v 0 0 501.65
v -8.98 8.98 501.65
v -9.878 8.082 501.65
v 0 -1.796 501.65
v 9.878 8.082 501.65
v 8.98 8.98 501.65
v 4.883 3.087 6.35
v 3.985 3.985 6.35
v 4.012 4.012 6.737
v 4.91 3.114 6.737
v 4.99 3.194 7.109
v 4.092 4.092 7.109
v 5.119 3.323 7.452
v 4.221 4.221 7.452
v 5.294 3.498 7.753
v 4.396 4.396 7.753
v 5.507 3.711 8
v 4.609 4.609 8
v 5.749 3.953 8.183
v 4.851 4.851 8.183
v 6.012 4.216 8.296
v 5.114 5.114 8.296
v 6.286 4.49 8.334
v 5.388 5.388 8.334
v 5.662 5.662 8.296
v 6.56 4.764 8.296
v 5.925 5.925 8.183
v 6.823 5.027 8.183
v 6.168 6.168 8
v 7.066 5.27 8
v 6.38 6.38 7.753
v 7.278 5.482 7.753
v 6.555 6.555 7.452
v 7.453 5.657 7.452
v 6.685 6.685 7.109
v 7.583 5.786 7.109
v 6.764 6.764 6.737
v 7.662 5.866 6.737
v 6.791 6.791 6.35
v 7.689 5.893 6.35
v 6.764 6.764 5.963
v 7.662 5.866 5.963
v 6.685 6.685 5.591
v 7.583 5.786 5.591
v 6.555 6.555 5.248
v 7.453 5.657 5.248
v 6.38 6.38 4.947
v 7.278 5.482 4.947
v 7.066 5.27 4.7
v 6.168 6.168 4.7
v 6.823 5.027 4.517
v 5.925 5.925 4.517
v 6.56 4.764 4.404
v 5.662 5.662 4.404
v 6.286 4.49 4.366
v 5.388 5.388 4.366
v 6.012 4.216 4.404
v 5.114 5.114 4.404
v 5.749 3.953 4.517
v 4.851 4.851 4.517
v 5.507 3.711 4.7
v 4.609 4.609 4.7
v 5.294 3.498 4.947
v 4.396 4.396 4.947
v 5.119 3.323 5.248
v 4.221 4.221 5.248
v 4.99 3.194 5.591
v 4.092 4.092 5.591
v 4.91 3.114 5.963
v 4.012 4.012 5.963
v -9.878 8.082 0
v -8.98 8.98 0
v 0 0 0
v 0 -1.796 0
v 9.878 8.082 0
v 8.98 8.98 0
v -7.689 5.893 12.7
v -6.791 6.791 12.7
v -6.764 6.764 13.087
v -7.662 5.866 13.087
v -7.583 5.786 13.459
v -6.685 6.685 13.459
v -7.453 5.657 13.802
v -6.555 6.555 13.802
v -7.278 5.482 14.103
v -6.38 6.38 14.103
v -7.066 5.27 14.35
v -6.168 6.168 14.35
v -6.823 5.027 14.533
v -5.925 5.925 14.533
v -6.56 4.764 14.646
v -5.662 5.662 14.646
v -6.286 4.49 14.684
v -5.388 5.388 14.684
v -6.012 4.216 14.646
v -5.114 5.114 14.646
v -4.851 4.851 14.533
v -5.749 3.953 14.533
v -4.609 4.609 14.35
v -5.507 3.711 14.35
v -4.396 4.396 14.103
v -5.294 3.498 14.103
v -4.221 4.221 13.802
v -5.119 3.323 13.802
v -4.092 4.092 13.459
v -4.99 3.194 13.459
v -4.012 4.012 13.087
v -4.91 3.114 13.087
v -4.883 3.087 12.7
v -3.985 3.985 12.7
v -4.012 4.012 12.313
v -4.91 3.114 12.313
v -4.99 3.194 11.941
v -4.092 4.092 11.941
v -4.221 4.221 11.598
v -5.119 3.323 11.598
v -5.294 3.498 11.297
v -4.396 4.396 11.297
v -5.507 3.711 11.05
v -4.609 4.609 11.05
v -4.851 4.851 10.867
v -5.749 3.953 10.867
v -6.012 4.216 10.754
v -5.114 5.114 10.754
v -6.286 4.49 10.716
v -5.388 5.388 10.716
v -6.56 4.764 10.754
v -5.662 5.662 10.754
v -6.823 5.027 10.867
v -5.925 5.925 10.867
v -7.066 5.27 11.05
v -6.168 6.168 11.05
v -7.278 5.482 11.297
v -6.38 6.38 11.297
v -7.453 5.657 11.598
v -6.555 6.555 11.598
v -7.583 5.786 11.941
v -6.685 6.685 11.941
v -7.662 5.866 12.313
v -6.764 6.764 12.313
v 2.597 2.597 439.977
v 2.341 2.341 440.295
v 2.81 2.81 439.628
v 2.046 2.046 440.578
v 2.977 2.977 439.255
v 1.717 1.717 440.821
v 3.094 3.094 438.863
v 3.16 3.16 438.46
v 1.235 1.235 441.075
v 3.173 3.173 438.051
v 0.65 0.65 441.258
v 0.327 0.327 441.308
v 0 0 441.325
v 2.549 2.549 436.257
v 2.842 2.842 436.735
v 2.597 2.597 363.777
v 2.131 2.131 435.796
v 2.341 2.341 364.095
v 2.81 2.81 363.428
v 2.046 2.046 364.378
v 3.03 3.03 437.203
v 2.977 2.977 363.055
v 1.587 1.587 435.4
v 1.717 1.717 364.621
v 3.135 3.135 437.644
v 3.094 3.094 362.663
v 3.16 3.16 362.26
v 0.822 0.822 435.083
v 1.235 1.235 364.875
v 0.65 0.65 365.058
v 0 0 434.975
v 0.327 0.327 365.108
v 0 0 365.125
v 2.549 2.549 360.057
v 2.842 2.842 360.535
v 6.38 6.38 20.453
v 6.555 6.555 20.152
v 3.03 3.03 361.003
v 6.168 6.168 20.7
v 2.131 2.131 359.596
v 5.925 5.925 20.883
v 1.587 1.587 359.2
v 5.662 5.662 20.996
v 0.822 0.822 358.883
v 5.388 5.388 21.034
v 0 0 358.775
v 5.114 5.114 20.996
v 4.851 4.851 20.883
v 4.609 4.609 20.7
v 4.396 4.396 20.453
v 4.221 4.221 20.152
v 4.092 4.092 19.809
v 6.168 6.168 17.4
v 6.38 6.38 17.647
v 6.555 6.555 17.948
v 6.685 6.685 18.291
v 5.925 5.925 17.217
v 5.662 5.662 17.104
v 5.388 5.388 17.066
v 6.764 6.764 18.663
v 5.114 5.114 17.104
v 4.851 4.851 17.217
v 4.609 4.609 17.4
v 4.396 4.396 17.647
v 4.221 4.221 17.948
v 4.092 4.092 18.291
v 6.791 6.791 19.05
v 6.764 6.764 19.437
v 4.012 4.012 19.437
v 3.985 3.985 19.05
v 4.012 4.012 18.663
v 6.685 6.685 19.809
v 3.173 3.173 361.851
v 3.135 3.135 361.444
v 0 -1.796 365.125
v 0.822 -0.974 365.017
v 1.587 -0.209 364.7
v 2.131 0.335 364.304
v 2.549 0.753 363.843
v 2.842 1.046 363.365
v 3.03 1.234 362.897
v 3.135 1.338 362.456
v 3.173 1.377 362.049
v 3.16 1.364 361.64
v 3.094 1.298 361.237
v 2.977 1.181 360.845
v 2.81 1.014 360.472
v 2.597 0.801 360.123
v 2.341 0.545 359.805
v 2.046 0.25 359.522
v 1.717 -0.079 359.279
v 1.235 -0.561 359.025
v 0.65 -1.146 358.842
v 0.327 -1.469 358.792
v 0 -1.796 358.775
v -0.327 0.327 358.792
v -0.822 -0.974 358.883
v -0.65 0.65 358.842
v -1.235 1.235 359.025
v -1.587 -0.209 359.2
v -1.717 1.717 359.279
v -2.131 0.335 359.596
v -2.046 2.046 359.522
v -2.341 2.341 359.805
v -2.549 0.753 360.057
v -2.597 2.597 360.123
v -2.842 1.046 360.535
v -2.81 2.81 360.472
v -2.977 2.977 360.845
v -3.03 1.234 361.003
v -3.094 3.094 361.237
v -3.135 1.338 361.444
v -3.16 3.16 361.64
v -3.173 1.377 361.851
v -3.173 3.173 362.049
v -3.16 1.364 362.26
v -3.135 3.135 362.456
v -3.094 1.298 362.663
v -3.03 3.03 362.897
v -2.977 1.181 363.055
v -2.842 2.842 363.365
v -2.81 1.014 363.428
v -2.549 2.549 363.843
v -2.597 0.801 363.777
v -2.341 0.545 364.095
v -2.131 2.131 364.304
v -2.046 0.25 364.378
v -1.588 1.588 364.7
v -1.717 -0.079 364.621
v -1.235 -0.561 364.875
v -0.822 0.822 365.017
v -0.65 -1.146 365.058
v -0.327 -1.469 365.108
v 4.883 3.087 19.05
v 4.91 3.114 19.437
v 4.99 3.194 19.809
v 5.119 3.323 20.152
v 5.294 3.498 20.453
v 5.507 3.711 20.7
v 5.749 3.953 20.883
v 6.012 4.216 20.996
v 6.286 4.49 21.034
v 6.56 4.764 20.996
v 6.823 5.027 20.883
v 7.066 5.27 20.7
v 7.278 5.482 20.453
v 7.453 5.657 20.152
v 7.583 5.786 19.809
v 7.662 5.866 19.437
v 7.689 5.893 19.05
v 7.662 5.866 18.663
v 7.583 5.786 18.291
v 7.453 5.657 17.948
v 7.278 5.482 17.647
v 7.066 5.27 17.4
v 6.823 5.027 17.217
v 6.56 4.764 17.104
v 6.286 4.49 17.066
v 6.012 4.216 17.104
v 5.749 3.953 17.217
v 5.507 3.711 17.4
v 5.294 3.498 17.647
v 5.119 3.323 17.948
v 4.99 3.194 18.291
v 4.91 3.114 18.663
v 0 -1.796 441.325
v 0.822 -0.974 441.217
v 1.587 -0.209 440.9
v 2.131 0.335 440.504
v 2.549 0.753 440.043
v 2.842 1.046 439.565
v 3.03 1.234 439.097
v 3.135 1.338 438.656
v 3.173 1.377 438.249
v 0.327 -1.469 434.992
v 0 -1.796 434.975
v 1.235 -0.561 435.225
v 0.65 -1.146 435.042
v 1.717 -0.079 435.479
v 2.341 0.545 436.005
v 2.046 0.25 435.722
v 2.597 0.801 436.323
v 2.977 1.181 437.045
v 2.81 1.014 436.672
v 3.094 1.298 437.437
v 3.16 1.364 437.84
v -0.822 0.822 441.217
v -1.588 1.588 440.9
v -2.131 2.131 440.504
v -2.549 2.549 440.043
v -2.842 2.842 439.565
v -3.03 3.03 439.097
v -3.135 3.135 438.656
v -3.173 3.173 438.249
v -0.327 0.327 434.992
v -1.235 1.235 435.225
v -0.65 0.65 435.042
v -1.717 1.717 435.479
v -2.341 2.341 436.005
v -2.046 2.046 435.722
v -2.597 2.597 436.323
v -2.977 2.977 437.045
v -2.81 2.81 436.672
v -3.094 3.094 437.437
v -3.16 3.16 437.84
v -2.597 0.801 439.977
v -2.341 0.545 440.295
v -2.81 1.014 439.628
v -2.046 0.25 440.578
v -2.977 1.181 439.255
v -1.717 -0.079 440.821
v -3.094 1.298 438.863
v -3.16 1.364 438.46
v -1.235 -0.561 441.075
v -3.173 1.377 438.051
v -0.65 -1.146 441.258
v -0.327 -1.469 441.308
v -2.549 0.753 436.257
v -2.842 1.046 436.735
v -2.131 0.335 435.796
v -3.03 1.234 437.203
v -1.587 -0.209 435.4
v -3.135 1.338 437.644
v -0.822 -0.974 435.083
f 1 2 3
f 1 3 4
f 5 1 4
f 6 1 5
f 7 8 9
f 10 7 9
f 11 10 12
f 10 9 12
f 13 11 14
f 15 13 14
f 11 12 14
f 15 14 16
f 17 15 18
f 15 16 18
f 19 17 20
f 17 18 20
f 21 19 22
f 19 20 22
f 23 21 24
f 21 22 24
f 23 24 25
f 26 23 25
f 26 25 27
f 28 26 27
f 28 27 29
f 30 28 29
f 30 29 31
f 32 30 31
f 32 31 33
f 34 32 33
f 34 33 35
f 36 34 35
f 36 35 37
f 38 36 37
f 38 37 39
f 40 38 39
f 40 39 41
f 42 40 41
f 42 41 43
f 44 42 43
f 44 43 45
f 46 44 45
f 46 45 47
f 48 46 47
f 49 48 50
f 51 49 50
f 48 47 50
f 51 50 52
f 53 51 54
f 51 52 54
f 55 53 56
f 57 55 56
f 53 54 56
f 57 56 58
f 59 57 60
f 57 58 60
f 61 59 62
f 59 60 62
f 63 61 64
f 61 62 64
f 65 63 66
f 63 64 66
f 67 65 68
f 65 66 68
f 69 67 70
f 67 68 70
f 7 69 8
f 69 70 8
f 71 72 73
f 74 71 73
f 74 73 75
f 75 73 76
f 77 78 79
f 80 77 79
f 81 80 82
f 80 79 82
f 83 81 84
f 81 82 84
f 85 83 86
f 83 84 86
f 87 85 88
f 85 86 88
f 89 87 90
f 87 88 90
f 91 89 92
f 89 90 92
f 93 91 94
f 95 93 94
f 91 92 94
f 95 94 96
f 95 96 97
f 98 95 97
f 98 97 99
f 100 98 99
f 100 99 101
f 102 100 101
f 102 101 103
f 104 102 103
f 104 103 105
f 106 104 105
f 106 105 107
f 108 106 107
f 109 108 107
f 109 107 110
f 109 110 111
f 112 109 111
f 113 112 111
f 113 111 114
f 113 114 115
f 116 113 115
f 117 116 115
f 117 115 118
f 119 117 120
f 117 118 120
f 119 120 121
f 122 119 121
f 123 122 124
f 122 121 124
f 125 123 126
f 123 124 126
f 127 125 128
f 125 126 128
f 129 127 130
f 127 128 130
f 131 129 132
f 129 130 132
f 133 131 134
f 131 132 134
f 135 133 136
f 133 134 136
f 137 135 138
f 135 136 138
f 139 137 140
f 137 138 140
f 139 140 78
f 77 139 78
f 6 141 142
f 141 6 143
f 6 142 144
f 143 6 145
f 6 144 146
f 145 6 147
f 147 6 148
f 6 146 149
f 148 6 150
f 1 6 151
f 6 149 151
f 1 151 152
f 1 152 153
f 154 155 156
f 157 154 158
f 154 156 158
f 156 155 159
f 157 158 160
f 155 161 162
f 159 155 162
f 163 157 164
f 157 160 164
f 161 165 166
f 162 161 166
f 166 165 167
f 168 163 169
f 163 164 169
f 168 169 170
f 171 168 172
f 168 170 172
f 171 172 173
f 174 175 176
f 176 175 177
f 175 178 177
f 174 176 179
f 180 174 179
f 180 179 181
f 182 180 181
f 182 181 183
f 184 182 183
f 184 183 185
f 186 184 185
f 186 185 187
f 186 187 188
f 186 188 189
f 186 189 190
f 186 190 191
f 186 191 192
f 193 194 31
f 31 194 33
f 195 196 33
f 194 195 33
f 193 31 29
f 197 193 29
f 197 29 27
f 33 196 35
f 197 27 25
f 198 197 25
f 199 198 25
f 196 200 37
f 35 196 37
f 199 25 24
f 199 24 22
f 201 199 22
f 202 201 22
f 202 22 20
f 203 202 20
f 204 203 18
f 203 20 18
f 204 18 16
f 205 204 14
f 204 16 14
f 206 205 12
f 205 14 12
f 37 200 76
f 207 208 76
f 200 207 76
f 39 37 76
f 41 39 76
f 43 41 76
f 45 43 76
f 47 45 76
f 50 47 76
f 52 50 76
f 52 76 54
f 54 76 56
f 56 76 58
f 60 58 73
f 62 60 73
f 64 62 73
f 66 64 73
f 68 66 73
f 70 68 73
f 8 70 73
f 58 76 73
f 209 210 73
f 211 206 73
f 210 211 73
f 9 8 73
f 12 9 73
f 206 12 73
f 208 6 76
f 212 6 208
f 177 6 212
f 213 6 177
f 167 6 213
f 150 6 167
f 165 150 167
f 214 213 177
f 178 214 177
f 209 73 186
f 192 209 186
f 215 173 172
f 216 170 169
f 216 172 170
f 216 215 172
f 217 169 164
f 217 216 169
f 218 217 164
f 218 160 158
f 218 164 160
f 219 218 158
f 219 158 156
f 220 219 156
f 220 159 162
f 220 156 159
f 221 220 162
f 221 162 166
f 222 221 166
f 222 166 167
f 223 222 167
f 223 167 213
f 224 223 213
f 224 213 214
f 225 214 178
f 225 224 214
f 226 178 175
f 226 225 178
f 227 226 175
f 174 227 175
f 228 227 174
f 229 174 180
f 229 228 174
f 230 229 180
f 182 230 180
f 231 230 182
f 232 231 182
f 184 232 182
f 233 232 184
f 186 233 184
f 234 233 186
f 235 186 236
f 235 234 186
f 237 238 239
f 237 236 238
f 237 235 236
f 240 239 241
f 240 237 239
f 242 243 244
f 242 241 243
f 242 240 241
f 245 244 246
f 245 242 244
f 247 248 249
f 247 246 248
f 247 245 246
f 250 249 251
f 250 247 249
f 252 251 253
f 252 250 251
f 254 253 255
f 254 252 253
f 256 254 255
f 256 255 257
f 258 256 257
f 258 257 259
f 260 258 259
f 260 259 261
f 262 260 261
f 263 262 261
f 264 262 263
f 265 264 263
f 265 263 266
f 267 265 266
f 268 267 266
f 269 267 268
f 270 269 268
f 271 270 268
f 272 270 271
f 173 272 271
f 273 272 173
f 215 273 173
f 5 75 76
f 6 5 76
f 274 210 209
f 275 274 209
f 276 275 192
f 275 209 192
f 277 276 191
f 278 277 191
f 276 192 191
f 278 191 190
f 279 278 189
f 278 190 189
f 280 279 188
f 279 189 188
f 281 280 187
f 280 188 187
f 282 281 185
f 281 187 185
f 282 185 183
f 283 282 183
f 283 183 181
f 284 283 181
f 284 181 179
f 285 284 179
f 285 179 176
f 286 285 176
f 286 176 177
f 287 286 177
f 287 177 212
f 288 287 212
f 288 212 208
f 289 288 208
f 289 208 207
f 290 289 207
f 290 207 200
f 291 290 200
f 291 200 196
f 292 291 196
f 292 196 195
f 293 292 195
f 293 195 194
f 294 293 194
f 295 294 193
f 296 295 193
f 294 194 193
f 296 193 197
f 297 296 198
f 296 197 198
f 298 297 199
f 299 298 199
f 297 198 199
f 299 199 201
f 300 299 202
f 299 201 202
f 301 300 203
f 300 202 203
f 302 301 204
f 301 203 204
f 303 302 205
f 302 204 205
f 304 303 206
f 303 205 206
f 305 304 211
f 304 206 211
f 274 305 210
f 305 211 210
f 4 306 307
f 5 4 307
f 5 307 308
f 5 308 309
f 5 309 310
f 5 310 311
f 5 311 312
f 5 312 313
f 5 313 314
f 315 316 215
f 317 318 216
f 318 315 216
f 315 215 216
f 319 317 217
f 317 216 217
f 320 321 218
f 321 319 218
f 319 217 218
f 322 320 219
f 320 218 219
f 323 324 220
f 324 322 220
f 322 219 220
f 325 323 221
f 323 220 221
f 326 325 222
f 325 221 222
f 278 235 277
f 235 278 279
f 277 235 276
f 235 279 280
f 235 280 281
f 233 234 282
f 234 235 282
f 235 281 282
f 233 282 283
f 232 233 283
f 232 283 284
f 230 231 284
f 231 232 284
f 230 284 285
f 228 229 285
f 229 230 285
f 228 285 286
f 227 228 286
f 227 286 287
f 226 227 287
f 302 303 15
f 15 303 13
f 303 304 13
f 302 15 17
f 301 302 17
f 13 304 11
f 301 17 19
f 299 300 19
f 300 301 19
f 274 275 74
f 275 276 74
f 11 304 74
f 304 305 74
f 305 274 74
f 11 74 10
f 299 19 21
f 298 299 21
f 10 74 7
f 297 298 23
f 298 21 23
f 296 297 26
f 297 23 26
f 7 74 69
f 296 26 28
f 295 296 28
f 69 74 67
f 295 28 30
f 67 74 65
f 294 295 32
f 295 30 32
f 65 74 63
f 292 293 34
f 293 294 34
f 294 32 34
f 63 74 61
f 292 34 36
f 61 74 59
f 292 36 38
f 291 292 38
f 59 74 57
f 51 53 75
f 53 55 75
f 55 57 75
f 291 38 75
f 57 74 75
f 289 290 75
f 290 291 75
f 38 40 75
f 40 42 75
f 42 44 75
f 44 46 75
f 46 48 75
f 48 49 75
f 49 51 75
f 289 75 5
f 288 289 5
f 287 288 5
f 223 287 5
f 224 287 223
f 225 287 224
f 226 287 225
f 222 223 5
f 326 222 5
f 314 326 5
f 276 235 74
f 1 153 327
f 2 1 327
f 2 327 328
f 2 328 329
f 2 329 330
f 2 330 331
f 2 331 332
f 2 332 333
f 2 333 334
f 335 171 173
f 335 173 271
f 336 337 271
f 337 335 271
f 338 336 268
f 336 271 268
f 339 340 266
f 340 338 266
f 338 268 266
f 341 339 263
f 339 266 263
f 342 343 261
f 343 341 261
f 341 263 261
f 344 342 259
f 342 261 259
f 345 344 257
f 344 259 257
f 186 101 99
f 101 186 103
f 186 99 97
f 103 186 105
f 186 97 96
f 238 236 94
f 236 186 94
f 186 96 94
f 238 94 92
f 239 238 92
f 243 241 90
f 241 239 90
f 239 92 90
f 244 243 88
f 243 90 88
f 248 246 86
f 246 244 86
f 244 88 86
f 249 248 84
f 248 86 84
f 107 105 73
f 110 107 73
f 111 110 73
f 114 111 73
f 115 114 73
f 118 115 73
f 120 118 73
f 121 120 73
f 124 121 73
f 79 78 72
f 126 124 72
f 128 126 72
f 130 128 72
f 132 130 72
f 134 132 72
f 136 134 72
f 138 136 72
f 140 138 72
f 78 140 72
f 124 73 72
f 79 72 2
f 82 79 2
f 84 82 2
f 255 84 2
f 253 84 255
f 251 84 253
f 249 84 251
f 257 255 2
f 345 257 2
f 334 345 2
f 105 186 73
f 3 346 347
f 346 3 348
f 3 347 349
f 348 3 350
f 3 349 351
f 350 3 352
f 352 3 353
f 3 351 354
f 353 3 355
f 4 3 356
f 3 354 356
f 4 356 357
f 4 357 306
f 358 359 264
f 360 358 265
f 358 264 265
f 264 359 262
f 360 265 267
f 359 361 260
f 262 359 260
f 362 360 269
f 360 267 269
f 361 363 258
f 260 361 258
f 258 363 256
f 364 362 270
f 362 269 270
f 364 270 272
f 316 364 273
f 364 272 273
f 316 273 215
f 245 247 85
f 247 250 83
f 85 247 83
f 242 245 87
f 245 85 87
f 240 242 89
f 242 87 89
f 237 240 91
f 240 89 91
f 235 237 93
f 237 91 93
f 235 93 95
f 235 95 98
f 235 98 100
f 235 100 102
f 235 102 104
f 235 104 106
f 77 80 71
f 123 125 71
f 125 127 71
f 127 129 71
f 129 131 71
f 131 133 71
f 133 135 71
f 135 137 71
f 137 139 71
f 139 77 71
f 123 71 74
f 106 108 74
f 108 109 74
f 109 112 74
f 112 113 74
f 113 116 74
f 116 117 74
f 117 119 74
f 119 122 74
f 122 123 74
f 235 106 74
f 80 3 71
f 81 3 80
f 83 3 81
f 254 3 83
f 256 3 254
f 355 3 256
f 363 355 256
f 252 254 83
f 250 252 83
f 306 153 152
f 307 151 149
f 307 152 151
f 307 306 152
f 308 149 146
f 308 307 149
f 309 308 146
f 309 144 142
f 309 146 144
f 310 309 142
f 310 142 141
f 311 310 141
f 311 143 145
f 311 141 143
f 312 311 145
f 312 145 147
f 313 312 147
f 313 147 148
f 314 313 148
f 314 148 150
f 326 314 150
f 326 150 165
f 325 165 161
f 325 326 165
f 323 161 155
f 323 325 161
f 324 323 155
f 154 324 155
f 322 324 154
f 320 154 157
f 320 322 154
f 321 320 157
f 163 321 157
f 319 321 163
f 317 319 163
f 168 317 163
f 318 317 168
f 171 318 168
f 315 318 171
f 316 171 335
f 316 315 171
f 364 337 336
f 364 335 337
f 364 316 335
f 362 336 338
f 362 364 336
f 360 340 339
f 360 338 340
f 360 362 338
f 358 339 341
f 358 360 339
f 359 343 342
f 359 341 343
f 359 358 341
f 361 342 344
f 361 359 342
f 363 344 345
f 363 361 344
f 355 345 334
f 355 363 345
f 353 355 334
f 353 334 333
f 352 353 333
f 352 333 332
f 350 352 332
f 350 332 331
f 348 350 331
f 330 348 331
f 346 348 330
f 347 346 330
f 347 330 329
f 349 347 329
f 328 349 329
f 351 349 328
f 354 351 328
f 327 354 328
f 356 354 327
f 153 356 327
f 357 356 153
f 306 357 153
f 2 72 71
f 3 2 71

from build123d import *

# Parameters (mm, degrees)
BOSS_EXTRUDE1_DEPTH     = 501.65
SKETCH2_R               = 1.984375
CUT_EXTRUDE1_DEPTH      = 502.8276078
SKETCH3_R               = 1.984375
CUT_EXTRUDE2_DEPTH      = 502.8276078
CUT_EXTRUDE4_DEPTH      = 502.8276078
CUT_EXTRUDE4_DEPTH_BACK = 502.8276078
SKETCH4_R               = 3.175


with BuildPart() as part:
    # Sketch1 → Boss-Extrude1 (new body)
    with BuildSketch(Plane.XY):
        Polygon((0, 0), (-8.980256121, 8.980256121), (-9.878281733, 8.082230509), (0, -1.796051224), (9.878281733, 8.082230509), (8.980256121, 8.980256121), align=None)
    extrude(amount=BOSS_EXTRUDE1_DEPTH)

    # Sketch2 → Cut-Extrude1 (cut, through all)
    with BuildSketch(Plane(origin=(0, 0, 0), x_dir=(0, 0, 1), z_dir=(-0.7071067811865471, 0.7071067811865479, 0))):
        with Locations(Location((6.35, 7.62, 0), (0, 0, 270))):
            Circle(SKETCH2_R)
        with Locations(Location((19.05, 7.62, 0), (0, 0, 270))):
            Circle(SKETCH2_R)
    extrude(amount=-CUT_EXTRUDE1_DEPTH, mode=Mode.SUBTRACT)

    # Sketch3 → Cut-Extrude2 (cut, through all)
    with BuildSketch(Plane(origin=(0, 0, 0), x_dir=(0, 0, -1), z_dir=(0.7071067811865482, 0.7071067811865468, 0))):
        with Locations(Location((-12.7, 7.62, 0), (0, 0, 90))):
            Circle(SKETCH3_R)
    extrude(amount=-CUT_EXTRUDE2_DEPTH, mode=Mode.SUBTRACT)

    # Sketch4 → Cut-Extrude4 (cut, two sides: drawn at the far end of the back side and taken through both)
    with BuildSketch(Plane(origin=(0, 0, 0), x_dir=(1, 0, 0), z_dir=(0, 1, 0)).offset(-CUT_EXTRUDE4_DEPTH_BACK)):
        with Locations(Location((0, -438.15, 0), (0, 0, 270))):
            Circle(SKETCH4_R)
        with Locations(Location((0, -361.95, 0), (0, 0, 270))):
            Circle(SKETCH4_R)
    extrude(amount=CUT_EXTRUDE4_DEPTH + CUT_EXTRUDE4_DEPTH_BACK, mode=Mode.SUBTRACT)


solid = part.part
